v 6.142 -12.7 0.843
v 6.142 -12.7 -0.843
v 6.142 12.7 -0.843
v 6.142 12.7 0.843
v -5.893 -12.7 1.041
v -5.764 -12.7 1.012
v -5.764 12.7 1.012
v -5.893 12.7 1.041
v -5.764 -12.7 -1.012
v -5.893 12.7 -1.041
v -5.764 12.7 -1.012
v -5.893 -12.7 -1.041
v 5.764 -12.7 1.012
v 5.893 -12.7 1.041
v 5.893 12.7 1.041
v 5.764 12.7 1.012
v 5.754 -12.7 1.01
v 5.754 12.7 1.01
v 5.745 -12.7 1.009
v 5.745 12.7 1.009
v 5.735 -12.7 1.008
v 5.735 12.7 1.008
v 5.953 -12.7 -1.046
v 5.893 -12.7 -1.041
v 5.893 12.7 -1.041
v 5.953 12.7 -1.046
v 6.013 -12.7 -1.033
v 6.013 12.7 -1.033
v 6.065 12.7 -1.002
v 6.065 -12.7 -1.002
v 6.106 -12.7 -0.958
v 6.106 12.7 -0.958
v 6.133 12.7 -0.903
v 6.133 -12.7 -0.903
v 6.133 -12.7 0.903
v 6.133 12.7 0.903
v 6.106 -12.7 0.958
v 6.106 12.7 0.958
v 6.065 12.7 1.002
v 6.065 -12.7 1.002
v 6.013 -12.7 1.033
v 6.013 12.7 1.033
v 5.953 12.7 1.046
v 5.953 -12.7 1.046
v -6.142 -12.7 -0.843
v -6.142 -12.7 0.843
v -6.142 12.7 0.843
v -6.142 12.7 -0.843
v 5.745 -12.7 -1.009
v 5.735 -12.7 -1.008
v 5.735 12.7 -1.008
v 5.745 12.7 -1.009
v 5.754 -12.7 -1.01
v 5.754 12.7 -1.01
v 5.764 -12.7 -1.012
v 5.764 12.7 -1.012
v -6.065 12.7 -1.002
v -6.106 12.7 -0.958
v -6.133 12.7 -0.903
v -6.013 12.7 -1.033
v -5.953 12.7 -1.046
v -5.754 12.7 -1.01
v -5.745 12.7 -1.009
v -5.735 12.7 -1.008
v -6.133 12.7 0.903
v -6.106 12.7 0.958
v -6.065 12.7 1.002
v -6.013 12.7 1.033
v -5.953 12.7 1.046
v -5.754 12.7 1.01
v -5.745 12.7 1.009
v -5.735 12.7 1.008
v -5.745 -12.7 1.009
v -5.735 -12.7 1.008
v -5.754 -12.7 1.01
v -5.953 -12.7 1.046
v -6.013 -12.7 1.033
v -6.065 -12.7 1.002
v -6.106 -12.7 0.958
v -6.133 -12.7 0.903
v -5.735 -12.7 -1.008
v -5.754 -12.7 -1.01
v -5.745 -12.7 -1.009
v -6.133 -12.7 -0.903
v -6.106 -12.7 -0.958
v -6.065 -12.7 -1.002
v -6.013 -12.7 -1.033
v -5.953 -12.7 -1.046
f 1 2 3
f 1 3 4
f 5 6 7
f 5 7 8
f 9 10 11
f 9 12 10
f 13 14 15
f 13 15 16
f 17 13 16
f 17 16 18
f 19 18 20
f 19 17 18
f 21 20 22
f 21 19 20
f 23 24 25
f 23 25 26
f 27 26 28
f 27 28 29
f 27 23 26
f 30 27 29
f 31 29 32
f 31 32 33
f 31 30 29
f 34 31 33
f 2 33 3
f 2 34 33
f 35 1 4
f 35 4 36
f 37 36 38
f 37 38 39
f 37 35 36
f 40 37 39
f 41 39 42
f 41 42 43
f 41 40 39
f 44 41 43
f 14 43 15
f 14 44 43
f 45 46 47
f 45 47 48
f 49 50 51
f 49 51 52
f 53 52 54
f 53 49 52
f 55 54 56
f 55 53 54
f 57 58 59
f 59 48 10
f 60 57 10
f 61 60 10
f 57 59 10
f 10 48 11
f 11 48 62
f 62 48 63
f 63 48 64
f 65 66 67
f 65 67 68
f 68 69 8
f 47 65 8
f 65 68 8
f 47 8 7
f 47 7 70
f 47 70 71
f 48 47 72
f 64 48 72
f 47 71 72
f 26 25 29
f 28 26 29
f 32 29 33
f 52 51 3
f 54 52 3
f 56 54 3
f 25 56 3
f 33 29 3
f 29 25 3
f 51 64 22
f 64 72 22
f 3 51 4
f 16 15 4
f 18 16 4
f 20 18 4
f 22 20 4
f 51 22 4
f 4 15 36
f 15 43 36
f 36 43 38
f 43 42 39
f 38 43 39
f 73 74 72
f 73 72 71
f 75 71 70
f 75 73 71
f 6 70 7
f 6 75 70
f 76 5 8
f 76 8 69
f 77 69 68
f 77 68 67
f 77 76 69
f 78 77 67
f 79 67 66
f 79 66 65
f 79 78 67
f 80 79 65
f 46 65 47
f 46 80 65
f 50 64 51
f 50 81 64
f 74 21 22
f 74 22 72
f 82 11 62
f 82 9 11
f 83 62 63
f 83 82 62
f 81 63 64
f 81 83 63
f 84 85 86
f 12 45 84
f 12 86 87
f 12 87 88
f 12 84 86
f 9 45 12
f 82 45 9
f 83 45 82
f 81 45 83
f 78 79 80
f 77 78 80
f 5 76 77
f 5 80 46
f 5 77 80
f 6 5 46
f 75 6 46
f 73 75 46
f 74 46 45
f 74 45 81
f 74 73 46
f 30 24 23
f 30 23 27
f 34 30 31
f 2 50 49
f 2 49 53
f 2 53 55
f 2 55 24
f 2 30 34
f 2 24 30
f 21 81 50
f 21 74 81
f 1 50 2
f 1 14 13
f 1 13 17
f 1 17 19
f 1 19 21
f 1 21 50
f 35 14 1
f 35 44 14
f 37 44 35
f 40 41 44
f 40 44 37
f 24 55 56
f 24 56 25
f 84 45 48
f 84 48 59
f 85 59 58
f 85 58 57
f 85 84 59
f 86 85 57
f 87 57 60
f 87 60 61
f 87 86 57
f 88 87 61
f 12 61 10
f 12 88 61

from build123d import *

# Parameters (mm, degrees)
F1_DEPTH = 12.7


with BuildPart() as f1:
    # F0 (on Front) → F1 (new body, symmetric)
    with BuildSketch(Plane.XZ):
        with BuildLine():
            Line((-5.73532, -1.00838), (5.73532, -1.00838))
            ThreePointArc((5.73532, -1.00838), (5.749638, -1.00919), (5.763773, -1.011608))
            Line((5.763773, -1.011608), (5.892995, -1.041315))
            ThreePointArc((5.892995, -1.041315), (6.065089, -1.002247), (6.14172, -0.84328))
            Line((6.14172, -0.84328), (6.14172, 0.84328))
            ThreePointArc((6.14172, 0.84328), (6.065089, 1.002247), (5.892995, 1.041315))
            Line((5.892995, 1.041315), (5.763773, 1.011608))
            ThreePointArc((5.763773, 1.011608), (5.749638, 1.00919), (5.73532, 1.00838))
            Line((5.73532, 1.00838), (-5.73532, 1.00838))
            ThreePointArc((-5.73532, 1.00838), (-5.749638, 1.00919), (-5.763773, 1.011608))
            Line((-5.763773, 1.011608), (-5.892995, 1.041315))
            ThreePointArc((-5.892995, 1.041315), (-6.065089, 1.002247), (-6.14172, 0.84328))
            Line((-6.14172, 0.84328), (-6.14172, -0.84328))
            ThreePointArc((-6.14172, -0.84328), (-6.065089, -1.002247), (-5.892995, -1.041315))
            Line((-5.892995, -1.041315), (-5.763773, -1.011608))
            ThreePointArc((-5.763773, -1.011608), (-5.749638, -1.00919), (-5.73532, -1.00838))
        make_face()
    extrude(amount=F1_DEPTH, both=True)


solid = f1.part
